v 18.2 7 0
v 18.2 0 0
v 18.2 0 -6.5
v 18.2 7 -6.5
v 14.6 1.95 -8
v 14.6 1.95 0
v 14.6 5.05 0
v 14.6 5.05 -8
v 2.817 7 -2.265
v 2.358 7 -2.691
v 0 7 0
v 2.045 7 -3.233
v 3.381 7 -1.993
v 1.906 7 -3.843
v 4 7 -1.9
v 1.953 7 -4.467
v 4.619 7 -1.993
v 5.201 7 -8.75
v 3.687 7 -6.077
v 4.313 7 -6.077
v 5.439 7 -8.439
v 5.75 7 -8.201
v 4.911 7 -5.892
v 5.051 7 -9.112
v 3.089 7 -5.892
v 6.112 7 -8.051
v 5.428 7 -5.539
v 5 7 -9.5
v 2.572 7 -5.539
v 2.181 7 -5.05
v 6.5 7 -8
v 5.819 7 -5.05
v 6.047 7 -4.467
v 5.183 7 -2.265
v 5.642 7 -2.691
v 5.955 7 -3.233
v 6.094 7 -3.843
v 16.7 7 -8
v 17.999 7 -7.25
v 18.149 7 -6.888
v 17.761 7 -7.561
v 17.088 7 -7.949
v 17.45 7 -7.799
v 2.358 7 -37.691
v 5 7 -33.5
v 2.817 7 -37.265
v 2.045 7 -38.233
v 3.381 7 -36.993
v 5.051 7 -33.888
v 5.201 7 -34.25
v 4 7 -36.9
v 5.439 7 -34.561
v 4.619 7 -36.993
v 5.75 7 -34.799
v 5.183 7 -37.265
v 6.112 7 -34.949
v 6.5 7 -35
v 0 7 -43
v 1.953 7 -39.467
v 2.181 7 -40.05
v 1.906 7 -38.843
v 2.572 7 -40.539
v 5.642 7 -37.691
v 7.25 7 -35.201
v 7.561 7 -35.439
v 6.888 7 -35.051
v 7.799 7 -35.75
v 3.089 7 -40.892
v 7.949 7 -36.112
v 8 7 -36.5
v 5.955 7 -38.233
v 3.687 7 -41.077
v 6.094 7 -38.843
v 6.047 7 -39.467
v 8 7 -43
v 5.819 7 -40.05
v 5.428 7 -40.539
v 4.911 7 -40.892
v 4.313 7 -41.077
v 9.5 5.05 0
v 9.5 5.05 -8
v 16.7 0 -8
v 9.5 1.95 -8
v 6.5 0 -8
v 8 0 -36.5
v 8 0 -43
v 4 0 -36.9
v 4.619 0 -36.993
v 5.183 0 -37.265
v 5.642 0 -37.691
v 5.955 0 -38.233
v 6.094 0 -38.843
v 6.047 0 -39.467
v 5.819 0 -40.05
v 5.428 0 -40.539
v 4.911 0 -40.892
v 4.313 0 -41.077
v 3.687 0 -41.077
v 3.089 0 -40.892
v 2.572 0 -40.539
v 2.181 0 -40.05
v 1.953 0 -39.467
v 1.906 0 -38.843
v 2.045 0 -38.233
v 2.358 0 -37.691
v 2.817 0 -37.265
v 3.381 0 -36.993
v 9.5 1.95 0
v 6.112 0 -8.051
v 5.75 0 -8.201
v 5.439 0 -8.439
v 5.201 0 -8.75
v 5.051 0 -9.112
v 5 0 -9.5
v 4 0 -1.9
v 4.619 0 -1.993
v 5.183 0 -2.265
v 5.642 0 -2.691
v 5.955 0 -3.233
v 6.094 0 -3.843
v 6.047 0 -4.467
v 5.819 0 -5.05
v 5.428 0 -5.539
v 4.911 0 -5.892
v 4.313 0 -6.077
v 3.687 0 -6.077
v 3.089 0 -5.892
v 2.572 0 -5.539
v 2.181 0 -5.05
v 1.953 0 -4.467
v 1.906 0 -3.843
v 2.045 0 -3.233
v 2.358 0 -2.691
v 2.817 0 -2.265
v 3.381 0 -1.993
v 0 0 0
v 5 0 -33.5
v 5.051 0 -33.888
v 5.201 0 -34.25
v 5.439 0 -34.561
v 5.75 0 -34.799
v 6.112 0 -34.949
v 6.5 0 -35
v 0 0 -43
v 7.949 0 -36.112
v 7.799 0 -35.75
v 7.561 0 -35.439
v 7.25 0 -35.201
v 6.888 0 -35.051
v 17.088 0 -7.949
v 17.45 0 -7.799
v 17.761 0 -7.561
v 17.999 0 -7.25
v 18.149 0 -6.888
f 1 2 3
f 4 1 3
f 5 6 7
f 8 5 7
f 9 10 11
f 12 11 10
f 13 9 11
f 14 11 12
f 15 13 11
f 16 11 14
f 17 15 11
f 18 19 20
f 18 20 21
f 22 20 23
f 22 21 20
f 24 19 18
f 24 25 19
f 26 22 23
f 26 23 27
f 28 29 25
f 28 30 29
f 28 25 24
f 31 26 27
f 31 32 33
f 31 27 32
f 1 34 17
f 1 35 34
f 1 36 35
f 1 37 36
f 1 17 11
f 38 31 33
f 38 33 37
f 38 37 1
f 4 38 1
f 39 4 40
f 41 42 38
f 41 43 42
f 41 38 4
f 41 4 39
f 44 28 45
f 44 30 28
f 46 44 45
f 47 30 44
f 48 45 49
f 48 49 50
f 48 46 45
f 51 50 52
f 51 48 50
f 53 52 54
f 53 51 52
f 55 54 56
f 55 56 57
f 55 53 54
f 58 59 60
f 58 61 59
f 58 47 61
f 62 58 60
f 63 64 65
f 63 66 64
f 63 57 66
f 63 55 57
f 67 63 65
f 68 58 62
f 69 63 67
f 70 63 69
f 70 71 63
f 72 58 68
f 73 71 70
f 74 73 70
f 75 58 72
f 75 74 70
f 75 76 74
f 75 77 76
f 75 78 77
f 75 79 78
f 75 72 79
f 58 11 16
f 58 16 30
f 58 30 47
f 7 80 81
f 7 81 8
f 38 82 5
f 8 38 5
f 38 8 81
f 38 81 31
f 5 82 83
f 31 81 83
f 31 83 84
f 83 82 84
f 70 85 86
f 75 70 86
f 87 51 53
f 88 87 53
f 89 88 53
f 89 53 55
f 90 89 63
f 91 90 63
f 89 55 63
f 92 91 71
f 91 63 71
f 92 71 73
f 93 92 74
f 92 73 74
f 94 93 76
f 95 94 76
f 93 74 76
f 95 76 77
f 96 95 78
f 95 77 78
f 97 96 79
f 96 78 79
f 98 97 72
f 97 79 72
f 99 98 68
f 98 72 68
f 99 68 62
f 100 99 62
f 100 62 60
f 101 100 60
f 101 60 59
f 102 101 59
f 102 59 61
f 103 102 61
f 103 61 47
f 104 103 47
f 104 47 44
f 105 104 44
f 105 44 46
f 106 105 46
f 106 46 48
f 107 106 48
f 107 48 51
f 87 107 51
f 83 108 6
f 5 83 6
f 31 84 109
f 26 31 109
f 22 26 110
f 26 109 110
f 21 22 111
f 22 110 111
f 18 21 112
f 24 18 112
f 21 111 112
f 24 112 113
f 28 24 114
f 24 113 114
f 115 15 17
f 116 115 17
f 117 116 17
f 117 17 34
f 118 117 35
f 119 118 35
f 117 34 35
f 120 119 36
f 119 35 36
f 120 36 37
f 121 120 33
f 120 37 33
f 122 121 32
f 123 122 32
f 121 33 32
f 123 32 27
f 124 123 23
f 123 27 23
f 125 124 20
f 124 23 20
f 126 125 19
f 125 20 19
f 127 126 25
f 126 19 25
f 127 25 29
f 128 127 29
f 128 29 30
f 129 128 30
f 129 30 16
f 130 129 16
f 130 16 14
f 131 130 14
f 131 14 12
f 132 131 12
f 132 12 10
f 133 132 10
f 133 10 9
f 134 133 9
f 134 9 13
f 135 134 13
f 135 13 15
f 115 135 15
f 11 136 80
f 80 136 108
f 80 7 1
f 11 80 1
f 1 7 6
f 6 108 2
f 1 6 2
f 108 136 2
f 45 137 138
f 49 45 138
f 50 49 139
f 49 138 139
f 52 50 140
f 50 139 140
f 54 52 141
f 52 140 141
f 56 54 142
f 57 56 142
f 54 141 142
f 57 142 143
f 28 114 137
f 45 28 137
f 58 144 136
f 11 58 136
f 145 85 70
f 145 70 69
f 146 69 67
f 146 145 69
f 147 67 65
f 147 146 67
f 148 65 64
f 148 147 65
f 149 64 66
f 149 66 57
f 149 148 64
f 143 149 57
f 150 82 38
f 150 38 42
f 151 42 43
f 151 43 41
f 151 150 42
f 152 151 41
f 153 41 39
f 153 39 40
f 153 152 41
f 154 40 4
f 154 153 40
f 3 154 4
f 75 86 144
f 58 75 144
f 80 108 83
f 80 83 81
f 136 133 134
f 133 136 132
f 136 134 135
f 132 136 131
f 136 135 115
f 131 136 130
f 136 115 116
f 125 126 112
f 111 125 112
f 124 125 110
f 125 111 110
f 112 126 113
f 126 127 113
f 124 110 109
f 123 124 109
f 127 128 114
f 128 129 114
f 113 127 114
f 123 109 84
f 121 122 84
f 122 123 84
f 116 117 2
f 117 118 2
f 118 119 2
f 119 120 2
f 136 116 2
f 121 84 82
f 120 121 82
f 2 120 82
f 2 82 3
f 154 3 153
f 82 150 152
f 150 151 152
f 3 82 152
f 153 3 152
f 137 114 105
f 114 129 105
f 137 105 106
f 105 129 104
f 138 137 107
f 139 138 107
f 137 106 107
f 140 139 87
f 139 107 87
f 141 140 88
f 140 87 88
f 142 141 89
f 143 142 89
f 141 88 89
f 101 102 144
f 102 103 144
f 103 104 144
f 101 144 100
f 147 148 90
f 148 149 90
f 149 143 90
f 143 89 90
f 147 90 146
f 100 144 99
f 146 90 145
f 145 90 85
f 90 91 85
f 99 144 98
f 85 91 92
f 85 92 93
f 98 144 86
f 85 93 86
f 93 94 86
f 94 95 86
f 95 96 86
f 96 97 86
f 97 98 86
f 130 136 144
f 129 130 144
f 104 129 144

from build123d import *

# Parameters (mm, degrees)
BOSS_EXTRUDE1_DEPTH = 7
CUT_EXTRUDE1_REACH  = 49.215
SKETCH2_W           = 5.1
SKETCH2_H           = 3.1
CUT_EXTRUDE2_REACH  = 49.215
SKETCH3_R           = 2.1
FILLET1_START       = -1
FILLET1_DEPTH       = 9
FILLET1_2_DEPTH     = 7


with BuildPart() as part:
    # Sketch1 → Boss-Extrude1 (new body)
    with BuildSketch(Plane(origin=(0, 0, 0), x_dir=(1, 0, 0), z_dir=(0, 1, 0))):
        Polygon((0, 0), (18.2, 0), (18.2, 8), (5, 8), (5, 35), (8, 35), (8, 43), (0, 43), align=None)
    extrude(amount=BOSS_EXTRUDE1_DEPTH)

    # Sketch2 → Cut-Extrude1 (cut, up to next)
    with BuildSketch(Plane.XY, mode=Mode.PRIVATE) as cut_extrude1_sk1:
        with Locations((12.05, 3.5)):
            Rectangle(SKETCH2_W, SKETCH2_H)
    cut_extrude1_tool1 = extrude(cut_extrude1_sk1.sketch, amount=-CUT_EXTRUDE1_REACH, mode=Mode.PRIVATE) & part.part
    add(cut_extrude1_tool1.solids().sort_by_distance((12.05, 3.5, 0))[0], mode=Mode.SUBTRACT)

    # Sketch3 → Cut-Extrude2 (cut, up to next)
    with BuildSketch(Plane(origin=(0, 7, 0), x_dir=(1, 0, 0), z_dir=(0, 1, 0)), mode=Mode.PRIVATE) as cut_extrude2_sk1:
        with Locations(Location((4, 39, 0), (0, 0, 270))):
            Circle(SKETCH3_R)
    cut_extrude2_tool1 = extrude(cut_extrude2_sk1.sketch, amount=-CUT_EXTRUDE2_REACH, mode=Mode.PRIVATE) & part.part
    # Sketch3 → Cut-Extrude2 (cut, up to next)
    with BuildSketch(Plane(origin=(0, 7, 0), x_dir=(1, 0, 0), z_dir=(0, 1, 0)), mode=Mode.PRIVATE) as cut_extrude2_sk2:
        with Locations(Location((4, 4, 0), (0, 0, 270))):
            Circle(SKETCH3_R)
    cut_extrude2_tool2 = extrude(cut_extrude2_sk2.sketch, amount=-CUT_EXTRUDE2_REACH, mode=Mode.PRIVATE) & part.part
    add(cut_extrude2_tool1.solids().sort_by_distance((4, 7, -39))[0], mode=Mode.SUBTRACT)
    add(cut_extrude2_tool2.solids().sort_by_distance((4, 7, -4))[0], mode=Mode.SUBTRACT)

    # Fillet1: read off the stored shape, not the designer's step
    # Fillet1 outline → Fillet1 (cut)
    with BuildSketch(Plane(origin=(0, 0, 0), x_dir=(1, 0, 0), z_dir=(0, 1, 0)).offset(FILLET1_START)):
        with BuildLine():
            Line((18.2, 8), (16.7, 8))
            ThreePointArc((16.7, 8), (17.760660172, 7.560660172), (18.2, 6.5))
            Line((18.2, 6.5), (18.2, 8))
        make_face()
        with BuildLine():
            ThreePointArc((8, 36.5), (7.560660172, 35.439339828), (6.5, 35))
            Line((6.5, 35), (8, 35))
            Line((8, 35), (8, 36.5))
        make_face()
    extrude(amount=FILLET1_DEPTH, mode=Mode.SUBTRACT)

    # Fillet1 2 outline → Fillet1 2 (add)
    with BuildSketch(Plane(origin=(0, 0, 0), x_dir=(1, 0, 0), z_dir=(0, 1, 0))):
        with BuildLine():
            Line((5, 35), (5, 33.5))
            ThreePointArc((5, 33.5), (5.439339828, 34.560660172), (6.5, 35))
            Line((6.5, 35), (5, 35))
        make_face()
        with BuildLine():
            Line((5, 8), (6.5, 8))
            ThreePointArc((6.5, 8), (5.439339828, 8.439339828), (5, 9.5))
            Line((5, 9.5), (5, 8))
        make_face()
    extrude(amount=FILLET1_2_DEPTH)


solid = part.part
